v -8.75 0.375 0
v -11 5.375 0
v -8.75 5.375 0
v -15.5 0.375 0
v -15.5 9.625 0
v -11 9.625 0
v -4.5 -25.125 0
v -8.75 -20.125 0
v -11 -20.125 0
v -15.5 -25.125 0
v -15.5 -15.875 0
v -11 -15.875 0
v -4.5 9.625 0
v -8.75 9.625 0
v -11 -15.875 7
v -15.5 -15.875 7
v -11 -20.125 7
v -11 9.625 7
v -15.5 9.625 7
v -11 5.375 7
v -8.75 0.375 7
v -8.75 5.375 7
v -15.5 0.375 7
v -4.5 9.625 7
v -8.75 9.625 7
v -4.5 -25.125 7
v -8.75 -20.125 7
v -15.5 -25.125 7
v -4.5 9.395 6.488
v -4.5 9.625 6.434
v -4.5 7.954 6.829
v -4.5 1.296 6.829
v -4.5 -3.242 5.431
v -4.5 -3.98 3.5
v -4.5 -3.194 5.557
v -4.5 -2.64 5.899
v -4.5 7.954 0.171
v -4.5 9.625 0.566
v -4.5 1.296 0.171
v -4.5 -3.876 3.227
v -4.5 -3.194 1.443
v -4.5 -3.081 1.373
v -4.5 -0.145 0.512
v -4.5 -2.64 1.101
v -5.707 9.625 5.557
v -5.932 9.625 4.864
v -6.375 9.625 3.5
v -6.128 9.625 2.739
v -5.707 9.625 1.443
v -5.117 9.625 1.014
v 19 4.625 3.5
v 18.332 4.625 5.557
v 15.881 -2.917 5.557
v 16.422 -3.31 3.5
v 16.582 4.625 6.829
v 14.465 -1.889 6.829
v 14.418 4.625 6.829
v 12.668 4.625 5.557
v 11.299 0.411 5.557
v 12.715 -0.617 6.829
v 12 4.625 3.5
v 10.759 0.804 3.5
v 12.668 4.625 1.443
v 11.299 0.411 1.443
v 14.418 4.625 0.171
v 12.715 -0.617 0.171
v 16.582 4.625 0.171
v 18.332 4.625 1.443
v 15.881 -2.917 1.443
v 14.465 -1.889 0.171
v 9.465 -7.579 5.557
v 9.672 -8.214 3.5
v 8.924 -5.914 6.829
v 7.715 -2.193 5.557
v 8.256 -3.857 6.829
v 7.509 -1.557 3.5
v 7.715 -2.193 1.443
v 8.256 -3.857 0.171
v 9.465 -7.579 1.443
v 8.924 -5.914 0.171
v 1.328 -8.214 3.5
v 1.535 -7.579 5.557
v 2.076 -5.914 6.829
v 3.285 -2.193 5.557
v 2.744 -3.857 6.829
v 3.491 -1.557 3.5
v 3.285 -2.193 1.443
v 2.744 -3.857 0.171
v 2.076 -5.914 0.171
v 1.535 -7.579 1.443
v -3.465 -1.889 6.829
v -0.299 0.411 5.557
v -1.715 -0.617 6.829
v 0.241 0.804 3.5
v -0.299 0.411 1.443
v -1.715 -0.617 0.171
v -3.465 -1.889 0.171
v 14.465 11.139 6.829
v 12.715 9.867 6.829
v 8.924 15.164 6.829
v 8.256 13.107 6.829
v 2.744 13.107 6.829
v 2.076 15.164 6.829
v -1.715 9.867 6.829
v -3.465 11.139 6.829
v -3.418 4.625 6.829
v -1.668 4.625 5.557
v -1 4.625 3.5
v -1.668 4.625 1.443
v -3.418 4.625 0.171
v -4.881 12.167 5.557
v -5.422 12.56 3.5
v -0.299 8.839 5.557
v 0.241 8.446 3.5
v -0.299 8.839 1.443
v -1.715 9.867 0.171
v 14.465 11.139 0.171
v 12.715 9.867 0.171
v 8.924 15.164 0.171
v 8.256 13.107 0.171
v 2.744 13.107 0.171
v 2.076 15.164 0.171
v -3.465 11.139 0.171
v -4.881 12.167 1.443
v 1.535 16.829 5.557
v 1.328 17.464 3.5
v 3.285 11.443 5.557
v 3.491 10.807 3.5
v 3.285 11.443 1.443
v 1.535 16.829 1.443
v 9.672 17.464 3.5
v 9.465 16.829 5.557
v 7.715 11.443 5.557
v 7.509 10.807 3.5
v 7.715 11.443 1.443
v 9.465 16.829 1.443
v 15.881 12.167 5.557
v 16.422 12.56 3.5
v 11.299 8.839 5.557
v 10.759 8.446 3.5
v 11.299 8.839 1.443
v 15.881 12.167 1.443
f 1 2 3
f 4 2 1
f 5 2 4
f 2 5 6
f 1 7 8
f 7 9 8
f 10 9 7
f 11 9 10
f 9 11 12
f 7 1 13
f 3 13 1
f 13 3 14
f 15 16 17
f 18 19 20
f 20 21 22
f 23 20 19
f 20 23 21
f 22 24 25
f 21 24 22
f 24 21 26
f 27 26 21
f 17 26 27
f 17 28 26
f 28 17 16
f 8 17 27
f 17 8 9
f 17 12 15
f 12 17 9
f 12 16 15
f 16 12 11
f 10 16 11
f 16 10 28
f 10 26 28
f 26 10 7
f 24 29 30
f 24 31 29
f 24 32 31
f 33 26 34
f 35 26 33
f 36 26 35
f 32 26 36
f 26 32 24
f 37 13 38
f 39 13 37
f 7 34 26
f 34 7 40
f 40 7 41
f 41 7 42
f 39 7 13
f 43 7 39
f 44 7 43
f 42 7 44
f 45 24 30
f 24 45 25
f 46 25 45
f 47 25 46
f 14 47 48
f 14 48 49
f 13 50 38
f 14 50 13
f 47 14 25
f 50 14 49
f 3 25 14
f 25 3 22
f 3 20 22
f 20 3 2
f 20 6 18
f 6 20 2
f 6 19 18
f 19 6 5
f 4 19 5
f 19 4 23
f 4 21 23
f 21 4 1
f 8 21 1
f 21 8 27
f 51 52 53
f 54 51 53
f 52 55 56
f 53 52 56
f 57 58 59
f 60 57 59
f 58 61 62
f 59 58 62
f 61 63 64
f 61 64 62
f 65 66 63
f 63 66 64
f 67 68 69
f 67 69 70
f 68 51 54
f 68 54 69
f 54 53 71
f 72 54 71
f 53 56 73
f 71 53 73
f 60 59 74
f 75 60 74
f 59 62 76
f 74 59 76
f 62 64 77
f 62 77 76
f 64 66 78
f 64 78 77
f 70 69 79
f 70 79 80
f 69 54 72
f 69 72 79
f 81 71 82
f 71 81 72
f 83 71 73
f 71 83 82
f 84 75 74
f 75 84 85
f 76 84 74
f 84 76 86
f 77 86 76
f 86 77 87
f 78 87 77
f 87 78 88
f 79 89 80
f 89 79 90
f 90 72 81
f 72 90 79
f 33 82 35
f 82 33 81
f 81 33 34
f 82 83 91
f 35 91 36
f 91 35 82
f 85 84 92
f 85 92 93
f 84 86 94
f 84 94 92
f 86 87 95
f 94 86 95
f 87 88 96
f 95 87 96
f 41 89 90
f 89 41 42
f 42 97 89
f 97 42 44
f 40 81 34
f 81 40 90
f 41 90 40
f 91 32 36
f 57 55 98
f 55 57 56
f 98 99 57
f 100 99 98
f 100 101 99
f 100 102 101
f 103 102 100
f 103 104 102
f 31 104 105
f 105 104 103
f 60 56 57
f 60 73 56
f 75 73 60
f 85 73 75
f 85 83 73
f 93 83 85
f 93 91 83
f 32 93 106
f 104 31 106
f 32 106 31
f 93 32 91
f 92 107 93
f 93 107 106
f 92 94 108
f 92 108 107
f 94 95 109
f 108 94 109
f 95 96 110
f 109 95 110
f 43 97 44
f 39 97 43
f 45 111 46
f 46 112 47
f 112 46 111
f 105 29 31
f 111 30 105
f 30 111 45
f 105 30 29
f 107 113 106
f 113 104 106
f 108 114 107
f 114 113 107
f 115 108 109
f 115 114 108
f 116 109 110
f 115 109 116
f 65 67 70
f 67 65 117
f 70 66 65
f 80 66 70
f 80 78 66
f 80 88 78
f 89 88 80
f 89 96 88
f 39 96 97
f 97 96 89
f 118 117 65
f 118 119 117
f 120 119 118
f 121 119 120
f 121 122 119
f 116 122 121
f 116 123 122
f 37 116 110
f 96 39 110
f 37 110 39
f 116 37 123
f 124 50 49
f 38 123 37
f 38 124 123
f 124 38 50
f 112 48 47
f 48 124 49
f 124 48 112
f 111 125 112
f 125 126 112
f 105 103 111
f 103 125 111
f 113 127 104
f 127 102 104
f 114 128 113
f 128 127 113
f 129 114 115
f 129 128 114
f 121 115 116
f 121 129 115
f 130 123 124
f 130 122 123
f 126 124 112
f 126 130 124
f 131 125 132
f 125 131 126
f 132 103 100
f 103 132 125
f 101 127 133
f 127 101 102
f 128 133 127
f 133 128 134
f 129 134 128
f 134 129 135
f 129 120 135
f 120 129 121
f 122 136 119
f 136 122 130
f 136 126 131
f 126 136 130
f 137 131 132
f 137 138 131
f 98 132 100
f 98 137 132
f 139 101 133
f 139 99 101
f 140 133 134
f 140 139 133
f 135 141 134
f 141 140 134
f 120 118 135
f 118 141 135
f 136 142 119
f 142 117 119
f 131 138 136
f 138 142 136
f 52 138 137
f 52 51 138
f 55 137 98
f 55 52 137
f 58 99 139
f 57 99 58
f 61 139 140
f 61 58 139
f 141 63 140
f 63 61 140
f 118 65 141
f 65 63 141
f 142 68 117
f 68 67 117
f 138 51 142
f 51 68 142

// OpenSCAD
//////////////////////////
// Customizable settings
//////////////////////////

// Debug or Relase (Make sure in release mode when done previewing!)
BuildMode=0;			//[0:Debug,1:Release]

// Ring type
HookType = 2;		//[0:Hook, 1:Vertical Ring, 2:Horizontal Ring]

// Diameter of base of round part of knob (in mm).  (Knurled ridges are not included in this measurement.)
WallHookWidth = 7;	// [7:13]

// Number of wall hooks.  This is the part attaching to the cube wall.
WallHookCount = 2;	// [1:Single, 2:Double (recommended), 3:Triple]

// The size of the hook, the distance between the wall and the inner side of the hook;
HookDiameter = 10;	// [7:30]

// The Hook Overhang is used if you want to make the hook extend up from the normal semi-circle hook.
HookOverhang = 0;		// [0:20]



//Hook innerDiameter
//Hook overHang (part that protrudes up from normal curve of hook)
//Hook Width (part that hangs on the wall and the diameter of the hook)
//how many rows of the SteelWall are hung by the chimney with care?
module wallHook (innerDiameter = 10,hookOverhang = 5,hookWidth=7,hangerCount=2, fnn=50)
{
	//scary stuff, don't look at this!	
	translate([-(innerDiameter+ 11/2),-(innerDiameter+11/2)/2-(9.25+(hangerCount-1)*25.5)/2,hookWidth/2])
	union()
	{
		hangers(count=hangerCount,wid=hookWidth);	
		translate([innerDiameter + 11,9.25+(hangerCount-1)*25.5,0])
		rotate([0,0,180])
		hook(innerRad=innerDiameter/2, dia=hookWidth, ovrhang=hookOverhang, tall=9.25+(hangerCount-1)*25.5, fn=fnn);
	}
}

module wallRing (innerDiameter = 10, hookWidth=7, hangerCount=2,horizontal=1, fnn=50)
{
	//scary stuff, don't look at this!	
	translate([-(innerDiameter+ 11/2),-(innerDiameter+11/2)/2-(9.25+(hangerCount-1)*25.5)/2,hookWidth/2])
	union()
	{
		hangers(count=hangerCount,wid=hookWidth);	
		translate([innerDiameter + 11,9.25+(hangerCount-1)*25.5,0])
		rotate([0,0,180])
		loop(innerRad=innerDiameter/2, dia=hookWidth, tall=9.25+(hangerCount-1)*25.5,horiz=horizontal, fn=fnn);
	}
}

module hangers(count=1, wid=5)
{
	topSection=[[0,0],[11,0],[11,9.25],[6.75,9.25],[6.75,5],[4.5,5],[4.5,9.25],[0,9.25]];
	midSection=[[6.75,0],[11,0],[11,16.25],[6.75,16.25]];

	linear_extrude(height=wid,center=true)
	union()
	{
		for(i = [0:count-1])
		{
			translate([0,25.5*i,0])
			polygon(points=topSection,paths=[[0,1,2,3,4,5,6,7]]);
			if(i>0)
			{
				translate([0,9.25+(i-1)*25.5,0])
				polygon(points=midSection,paths=[[0,1,2,3]]);
			}
		}
	}
}

module hook(dia=5,innerRad=6, fn=50, tall=34.75, ovrhang=0)
{
	render()
	union()
	{
		difference()
		{
			rotate_extrude(convexity = fn/2, $fn=fn)
			translate([innerRad*2, 0, 0])
			circle(r = dia/2, $fn=fn);	
			translate([0,innerRad+dia/4,0])
			cube([innerRad*4+dia,innerRad*2+dia/2,dia],center=true);
		}

		translate([innerRad*2,tall/2,0])
		rotate([90,0,0])
		cylinder(r=dia/2,h=tall,$fn=fn,center=true);
	
		translate([-(innerRad*2),ovrhang/2,0])
		rotate([90,0,0])
		cylinder(r=dia/2,h=ovrhang,center=true,$fn=fn);
		
		translate([-(innerRad*2),ovrhang,0])
		sphere(r=dia/2,center=true, $fn=fn);
	}
}

module loop(dia=5,innerRad=6, fn=50, tall=34.75, horiz=1)
{
	render()
	union()
	{
		translate([0,innerRad,0])
		rotate([horiz*90,0,0])
		difference()
		{
			rotate_extrude(convexity = fn/2, $fn=fn)
			translate([innerRad*2, 0, 0])
			circle(r = dia/2, $fn=fn);	
			//translate([0,innerRad+dia/4,0])
			//#cube([innerRad*4+dia,innerRad*2+dia/2,dia],center=true);
		}

//		translate([innerRad*2,tall/2,0])
//		rotate([90,0,0])
//		#cylinder(r=dia/2,h=tall,$fn=fn,center=true);
	}
}

if(HookType==0)
	wallHook (innerDiameter=HookDiameter,hookOverhang=HookOverhang,hookWidth=WallHookWidth,hangerCount=WallHookCount, fnn=BuildMode*40 + 10);
if(HookType==1)
	wallRing (innerDiameter=HookDiameter,hookWidth=WallHookWidth,hangerCount=WallHookCount,horizontal=1, fnn=BuildMode*40 + 10);
if(HookType==2)
	wallRing (innerDiameter=HookDiameter,hookWidth=WallHookWidth,hangerCount=WallHookCount,horizontal=0, fnn=BuildMode*40 + 10);
